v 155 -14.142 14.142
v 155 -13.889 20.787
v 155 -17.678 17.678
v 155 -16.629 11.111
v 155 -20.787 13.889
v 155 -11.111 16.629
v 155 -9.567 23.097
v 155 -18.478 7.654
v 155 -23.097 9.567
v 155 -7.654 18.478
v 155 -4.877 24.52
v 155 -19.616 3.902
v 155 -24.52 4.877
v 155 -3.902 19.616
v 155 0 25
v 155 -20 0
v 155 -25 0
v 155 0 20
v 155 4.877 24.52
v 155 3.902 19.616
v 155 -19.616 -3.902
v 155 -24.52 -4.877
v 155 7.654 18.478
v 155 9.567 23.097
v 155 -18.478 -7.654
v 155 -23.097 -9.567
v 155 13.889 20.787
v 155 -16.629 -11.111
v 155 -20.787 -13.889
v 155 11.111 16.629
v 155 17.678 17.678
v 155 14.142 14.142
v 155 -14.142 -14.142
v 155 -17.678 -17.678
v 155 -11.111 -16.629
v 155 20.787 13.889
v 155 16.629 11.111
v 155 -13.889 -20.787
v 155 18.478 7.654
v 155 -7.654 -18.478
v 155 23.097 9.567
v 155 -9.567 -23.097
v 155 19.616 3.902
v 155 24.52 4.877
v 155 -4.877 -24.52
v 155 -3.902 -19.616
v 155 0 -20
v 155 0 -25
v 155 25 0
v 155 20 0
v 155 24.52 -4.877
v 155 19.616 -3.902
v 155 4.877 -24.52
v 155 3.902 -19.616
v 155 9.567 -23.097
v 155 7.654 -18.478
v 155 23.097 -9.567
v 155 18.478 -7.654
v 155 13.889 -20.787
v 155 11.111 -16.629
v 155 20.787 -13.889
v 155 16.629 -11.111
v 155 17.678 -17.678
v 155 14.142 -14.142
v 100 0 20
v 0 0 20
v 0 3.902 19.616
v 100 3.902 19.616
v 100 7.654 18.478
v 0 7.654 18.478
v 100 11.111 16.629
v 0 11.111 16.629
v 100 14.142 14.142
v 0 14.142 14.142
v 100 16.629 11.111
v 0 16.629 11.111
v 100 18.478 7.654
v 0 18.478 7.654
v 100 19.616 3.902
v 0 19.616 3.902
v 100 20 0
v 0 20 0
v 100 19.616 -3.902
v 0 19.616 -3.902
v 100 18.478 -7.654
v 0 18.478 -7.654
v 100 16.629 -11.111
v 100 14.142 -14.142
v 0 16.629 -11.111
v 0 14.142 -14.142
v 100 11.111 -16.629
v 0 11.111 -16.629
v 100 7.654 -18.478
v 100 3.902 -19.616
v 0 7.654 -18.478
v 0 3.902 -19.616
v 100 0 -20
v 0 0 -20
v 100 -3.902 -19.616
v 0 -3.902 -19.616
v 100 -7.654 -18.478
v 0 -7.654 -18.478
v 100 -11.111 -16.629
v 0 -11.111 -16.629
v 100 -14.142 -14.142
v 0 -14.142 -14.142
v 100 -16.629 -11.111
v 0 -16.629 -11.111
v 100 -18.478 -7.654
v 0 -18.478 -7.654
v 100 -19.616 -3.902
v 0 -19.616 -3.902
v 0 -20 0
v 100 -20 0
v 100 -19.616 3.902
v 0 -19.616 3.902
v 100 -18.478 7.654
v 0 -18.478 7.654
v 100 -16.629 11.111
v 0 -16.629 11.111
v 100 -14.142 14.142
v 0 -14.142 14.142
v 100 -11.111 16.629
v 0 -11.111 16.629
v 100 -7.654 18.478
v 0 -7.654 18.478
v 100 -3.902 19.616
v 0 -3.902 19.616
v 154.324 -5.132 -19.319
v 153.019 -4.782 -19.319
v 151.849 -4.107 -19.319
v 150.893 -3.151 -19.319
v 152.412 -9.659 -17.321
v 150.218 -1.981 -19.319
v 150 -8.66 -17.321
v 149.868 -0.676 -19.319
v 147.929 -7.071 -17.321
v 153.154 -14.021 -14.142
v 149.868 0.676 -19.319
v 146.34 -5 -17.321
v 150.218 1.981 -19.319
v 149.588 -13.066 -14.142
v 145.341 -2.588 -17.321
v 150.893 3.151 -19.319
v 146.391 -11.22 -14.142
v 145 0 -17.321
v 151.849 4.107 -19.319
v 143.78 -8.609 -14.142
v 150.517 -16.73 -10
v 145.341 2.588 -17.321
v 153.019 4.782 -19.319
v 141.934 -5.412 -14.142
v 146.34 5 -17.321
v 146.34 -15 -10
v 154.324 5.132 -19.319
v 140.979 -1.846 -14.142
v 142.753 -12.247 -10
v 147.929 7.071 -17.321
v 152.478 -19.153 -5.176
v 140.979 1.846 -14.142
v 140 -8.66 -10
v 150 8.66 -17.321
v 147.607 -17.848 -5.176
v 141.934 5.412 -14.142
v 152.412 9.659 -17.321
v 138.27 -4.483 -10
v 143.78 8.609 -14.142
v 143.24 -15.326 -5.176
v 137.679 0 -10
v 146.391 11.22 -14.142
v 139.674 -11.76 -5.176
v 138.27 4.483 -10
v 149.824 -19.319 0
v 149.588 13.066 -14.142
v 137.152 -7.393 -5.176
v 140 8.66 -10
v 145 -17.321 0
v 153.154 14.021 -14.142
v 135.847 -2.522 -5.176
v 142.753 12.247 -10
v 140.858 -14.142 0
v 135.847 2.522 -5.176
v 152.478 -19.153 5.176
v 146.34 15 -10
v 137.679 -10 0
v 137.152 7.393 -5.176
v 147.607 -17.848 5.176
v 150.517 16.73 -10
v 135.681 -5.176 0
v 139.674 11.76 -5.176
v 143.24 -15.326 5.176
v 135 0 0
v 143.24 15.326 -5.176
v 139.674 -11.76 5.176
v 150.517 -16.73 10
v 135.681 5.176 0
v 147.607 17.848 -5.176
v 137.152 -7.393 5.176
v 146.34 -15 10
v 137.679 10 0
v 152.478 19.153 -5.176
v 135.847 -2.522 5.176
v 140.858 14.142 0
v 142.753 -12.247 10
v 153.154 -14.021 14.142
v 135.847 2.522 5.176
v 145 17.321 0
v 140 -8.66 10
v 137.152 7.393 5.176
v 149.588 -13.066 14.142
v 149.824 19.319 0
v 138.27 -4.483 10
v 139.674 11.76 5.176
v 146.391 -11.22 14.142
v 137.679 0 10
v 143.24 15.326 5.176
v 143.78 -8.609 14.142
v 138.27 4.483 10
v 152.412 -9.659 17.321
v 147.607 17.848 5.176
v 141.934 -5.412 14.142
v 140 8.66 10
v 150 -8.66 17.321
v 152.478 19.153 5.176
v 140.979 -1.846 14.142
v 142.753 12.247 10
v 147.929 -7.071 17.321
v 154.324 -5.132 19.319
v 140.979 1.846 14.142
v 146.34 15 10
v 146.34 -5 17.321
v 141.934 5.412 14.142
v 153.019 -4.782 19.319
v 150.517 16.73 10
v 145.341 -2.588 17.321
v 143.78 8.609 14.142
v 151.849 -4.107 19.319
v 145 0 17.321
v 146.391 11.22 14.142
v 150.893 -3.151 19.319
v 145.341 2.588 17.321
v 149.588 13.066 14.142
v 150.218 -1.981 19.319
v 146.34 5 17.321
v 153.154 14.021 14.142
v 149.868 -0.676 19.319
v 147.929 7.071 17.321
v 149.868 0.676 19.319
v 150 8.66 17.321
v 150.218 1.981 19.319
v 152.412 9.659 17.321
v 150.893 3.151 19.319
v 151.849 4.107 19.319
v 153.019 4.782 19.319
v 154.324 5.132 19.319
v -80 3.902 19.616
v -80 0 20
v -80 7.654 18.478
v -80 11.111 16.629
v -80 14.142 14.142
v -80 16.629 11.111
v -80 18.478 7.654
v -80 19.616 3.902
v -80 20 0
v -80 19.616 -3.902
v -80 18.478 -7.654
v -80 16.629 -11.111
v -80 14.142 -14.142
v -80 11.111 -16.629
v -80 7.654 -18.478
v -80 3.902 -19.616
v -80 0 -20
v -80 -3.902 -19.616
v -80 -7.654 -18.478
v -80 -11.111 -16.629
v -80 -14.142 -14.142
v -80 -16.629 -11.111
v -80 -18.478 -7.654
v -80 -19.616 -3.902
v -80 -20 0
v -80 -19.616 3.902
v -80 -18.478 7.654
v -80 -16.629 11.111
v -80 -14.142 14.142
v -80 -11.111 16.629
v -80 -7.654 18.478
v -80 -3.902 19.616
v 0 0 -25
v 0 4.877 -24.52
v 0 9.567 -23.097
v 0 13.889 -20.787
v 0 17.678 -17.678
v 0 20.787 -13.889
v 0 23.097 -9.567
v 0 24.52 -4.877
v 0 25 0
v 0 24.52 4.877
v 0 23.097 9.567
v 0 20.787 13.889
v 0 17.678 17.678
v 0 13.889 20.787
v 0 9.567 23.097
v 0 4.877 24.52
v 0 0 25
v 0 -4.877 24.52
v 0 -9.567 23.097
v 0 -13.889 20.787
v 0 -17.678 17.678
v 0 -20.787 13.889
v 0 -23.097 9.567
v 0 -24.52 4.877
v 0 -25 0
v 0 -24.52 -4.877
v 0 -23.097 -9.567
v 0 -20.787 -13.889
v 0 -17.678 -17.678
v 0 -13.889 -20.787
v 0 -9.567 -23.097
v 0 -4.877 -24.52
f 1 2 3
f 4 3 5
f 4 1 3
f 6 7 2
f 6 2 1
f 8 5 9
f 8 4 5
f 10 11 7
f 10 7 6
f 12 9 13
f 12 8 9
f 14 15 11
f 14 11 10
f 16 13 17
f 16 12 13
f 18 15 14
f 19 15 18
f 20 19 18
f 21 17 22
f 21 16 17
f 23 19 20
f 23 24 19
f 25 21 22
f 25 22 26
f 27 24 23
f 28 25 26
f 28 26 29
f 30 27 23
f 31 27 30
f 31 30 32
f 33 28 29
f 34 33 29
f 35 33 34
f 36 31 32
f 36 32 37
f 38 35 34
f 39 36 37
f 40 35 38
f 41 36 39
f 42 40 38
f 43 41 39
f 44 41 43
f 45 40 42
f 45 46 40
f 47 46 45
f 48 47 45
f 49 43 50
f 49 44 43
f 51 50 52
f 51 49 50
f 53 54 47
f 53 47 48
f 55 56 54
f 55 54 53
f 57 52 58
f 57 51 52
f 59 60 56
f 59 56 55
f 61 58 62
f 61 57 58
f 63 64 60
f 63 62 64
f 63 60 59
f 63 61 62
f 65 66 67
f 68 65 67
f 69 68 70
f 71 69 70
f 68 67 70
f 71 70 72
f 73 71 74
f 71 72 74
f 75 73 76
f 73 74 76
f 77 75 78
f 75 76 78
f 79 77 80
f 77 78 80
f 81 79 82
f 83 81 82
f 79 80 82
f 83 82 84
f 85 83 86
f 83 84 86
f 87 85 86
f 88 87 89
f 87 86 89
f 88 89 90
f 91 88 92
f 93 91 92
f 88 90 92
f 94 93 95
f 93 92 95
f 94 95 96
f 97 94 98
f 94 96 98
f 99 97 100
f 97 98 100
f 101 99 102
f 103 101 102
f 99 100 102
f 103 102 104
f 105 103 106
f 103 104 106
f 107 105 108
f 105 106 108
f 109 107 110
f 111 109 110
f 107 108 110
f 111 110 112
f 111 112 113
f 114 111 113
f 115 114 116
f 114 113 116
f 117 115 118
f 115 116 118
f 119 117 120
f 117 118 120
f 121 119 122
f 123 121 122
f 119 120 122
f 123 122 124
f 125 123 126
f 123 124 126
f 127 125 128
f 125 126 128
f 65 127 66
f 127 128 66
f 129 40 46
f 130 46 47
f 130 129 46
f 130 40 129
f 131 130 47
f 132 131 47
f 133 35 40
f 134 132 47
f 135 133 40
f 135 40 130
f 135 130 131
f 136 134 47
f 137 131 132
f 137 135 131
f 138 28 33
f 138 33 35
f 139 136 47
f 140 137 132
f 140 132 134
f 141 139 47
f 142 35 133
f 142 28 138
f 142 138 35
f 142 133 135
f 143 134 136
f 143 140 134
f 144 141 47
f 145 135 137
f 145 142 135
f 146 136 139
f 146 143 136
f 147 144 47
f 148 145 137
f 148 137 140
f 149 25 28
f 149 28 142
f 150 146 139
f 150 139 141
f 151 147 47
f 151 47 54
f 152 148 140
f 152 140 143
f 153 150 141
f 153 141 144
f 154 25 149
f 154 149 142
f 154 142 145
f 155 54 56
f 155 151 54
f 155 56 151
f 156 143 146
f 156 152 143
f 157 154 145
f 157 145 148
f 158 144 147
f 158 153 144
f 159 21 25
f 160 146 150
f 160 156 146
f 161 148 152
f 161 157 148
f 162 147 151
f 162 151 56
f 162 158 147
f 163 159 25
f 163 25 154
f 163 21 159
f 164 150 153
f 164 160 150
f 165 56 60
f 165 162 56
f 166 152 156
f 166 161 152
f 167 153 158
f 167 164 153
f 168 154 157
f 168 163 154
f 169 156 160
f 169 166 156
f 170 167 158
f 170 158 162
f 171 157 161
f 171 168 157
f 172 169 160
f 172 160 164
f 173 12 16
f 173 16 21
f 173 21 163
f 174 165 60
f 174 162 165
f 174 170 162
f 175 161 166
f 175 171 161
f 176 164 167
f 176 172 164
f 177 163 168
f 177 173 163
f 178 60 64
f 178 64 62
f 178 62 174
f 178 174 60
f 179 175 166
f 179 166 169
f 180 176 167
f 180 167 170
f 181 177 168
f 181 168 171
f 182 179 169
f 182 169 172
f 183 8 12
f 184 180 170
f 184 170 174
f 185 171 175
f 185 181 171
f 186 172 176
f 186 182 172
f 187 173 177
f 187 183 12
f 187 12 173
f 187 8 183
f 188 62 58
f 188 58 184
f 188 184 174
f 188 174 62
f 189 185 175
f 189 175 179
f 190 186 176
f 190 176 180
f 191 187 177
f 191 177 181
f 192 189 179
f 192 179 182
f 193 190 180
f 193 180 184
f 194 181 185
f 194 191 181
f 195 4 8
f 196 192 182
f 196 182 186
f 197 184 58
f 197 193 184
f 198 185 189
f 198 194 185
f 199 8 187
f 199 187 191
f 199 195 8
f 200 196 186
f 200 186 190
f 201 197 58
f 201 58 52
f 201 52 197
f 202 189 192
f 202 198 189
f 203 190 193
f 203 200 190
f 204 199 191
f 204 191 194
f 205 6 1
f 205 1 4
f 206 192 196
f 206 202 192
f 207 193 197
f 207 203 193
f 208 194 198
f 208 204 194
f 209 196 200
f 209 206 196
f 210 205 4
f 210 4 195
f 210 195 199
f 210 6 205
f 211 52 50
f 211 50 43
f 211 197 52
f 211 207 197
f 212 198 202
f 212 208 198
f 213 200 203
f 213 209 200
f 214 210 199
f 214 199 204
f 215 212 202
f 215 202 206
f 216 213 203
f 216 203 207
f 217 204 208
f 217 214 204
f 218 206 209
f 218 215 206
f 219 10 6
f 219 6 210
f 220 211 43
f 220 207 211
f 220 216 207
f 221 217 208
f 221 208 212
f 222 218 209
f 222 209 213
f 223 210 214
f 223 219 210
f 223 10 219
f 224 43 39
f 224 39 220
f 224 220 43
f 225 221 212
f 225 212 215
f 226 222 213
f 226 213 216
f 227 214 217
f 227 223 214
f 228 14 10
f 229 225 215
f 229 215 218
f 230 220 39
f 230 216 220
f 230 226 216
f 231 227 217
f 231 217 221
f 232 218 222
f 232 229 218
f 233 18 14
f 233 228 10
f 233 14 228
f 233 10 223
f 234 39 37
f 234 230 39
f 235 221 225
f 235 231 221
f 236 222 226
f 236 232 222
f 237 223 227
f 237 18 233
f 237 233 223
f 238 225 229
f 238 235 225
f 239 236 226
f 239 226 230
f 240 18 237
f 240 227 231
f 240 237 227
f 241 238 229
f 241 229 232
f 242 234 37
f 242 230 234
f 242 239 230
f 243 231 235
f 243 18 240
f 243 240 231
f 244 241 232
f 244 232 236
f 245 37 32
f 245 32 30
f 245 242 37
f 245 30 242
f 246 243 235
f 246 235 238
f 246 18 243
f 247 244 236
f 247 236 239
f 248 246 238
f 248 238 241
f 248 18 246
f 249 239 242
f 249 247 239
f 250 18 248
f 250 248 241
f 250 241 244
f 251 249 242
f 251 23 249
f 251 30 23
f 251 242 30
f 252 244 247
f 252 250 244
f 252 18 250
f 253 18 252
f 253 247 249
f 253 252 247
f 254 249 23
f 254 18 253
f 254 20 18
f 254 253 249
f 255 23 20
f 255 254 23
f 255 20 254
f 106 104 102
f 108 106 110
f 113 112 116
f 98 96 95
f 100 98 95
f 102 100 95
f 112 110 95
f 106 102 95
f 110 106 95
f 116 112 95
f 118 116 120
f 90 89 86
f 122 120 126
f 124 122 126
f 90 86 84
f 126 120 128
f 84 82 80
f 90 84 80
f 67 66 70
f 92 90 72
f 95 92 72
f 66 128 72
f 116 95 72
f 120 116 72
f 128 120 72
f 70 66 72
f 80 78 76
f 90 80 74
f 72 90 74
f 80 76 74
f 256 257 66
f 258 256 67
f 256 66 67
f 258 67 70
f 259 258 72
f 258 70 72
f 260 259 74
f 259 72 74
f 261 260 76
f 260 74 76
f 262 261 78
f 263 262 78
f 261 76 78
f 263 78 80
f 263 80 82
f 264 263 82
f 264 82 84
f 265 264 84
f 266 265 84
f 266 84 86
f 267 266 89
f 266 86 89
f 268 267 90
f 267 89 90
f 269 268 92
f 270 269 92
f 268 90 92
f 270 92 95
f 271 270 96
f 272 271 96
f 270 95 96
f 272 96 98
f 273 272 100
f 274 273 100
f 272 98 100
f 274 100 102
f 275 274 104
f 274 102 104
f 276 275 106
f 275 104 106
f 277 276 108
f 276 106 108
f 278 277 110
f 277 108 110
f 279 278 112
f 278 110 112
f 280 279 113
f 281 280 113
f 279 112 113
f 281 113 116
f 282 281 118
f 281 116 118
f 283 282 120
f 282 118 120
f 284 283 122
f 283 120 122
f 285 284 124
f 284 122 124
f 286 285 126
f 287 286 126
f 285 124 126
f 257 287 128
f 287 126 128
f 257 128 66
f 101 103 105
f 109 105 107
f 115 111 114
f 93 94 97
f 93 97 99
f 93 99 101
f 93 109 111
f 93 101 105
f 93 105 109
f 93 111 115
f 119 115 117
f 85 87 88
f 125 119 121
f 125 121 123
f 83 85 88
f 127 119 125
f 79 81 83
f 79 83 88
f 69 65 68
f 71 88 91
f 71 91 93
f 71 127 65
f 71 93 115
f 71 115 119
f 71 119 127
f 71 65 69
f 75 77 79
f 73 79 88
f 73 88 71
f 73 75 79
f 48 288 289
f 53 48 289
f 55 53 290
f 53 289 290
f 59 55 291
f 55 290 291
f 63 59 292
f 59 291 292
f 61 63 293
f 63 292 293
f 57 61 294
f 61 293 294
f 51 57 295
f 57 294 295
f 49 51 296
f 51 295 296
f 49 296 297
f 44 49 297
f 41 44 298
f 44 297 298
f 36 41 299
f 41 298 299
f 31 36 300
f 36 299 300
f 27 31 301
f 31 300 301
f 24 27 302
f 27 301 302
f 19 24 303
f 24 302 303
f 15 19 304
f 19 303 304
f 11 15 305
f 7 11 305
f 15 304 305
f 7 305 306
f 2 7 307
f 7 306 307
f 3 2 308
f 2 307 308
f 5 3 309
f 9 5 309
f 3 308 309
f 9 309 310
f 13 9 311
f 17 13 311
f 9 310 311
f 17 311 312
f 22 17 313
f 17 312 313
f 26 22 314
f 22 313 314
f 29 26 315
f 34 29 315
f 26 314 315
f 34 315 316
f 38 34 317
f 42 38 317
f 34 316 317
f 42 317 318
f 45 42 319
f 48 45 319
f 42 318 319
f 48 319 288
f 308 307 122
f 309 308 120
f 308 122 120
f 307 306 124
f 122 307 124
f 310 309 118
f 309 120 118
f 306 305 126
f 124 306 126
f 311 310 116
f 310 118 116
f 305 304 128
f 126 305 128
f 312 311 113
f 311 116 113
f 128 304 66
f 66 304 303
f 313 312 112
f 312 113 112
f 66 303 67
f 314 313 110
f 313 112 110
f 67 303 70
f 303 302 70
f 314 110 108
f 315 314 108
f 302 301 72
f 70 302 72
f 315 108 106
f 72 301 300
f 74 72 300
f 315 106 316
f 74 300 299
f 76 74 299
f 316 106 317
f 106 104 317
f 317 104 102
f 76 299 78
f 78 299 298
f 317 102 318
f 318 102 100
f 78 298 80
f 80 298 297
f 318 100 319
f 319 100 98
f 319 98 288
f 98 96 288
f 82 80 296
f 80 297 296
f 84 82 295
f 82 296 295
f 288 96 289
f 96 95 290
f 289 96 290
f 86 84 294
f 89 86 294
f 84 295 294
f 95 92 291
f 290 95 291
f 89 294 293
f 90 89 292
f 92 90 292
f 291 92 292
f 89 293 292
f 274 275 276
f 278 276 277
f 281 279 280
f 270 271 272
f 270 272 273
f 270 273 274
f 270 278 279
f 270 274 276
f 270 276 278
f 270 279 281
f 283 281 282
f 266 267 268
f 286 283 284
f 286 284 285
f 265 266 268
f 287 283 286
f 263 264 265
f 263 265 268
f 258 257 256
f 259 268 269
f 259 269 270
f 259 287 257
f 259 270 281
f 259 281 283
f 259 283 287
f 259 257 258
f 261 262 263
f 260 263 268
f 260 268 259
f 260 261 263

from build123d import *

# Parameters (mm, degrees)
SKETCH1_R           = 25
BOSS_EXTRUDE1_DEPTH = 155
SKETCH3_R           = 20
CUT_EXTRUDE1_DEPTH  = 100
SKETCH3_2_R         = 20
BOSS_EXTRUDE2_DEPTH = 80


with BuildPart() as part:
    # Sketch1 → Boss-Extrude1 (new body)
    with BuildSketch(Plane(origin=(0, 0, 0), x_dir=(0, 0, -1), z_dir=(1, 0, 0))):
        Circle(SKETCH1_R)
    extrude(amount=BOSS_EXTRUDE1_DEPTH)

    # Sketch2 → Cut-Revolve3 (revolve, cut)
    with BuildSketch(Plane(origin=(155, 0, 0), x_dir=(0, 0, -1), z_dir=(1, 0, 0))):
        with BuildLine():
            Line((-20, 0), (20, 0))
            ThreePointArc((20, 0), (0, 20), (-20, 0))
        make_face()
    revolve(axis=Axis((155, 0, 20), (0, 0, -1)), mode=Mode.SUBTRACT)

    # Sketch3 → Cut-Extrude1 (cut)
    with BuildSketch(Plane.ZY):
        Circle(SKETCH3_R)
    extrude(amount=-CUT_EXTRUDE1_DEPTH, mode=Mode.SUBTRACT)


with BuildPart() as body_2:
    # Sketch3<2> → Boss-Extrude2 (new body)
    with BuildSketch(Plane.ZY):
        Circle(SKETCH3_2_R)
    extrude(amount=BOSS_EXTRUDE2_DEPTH)


solid = Compound([part.part, body_2.part])
